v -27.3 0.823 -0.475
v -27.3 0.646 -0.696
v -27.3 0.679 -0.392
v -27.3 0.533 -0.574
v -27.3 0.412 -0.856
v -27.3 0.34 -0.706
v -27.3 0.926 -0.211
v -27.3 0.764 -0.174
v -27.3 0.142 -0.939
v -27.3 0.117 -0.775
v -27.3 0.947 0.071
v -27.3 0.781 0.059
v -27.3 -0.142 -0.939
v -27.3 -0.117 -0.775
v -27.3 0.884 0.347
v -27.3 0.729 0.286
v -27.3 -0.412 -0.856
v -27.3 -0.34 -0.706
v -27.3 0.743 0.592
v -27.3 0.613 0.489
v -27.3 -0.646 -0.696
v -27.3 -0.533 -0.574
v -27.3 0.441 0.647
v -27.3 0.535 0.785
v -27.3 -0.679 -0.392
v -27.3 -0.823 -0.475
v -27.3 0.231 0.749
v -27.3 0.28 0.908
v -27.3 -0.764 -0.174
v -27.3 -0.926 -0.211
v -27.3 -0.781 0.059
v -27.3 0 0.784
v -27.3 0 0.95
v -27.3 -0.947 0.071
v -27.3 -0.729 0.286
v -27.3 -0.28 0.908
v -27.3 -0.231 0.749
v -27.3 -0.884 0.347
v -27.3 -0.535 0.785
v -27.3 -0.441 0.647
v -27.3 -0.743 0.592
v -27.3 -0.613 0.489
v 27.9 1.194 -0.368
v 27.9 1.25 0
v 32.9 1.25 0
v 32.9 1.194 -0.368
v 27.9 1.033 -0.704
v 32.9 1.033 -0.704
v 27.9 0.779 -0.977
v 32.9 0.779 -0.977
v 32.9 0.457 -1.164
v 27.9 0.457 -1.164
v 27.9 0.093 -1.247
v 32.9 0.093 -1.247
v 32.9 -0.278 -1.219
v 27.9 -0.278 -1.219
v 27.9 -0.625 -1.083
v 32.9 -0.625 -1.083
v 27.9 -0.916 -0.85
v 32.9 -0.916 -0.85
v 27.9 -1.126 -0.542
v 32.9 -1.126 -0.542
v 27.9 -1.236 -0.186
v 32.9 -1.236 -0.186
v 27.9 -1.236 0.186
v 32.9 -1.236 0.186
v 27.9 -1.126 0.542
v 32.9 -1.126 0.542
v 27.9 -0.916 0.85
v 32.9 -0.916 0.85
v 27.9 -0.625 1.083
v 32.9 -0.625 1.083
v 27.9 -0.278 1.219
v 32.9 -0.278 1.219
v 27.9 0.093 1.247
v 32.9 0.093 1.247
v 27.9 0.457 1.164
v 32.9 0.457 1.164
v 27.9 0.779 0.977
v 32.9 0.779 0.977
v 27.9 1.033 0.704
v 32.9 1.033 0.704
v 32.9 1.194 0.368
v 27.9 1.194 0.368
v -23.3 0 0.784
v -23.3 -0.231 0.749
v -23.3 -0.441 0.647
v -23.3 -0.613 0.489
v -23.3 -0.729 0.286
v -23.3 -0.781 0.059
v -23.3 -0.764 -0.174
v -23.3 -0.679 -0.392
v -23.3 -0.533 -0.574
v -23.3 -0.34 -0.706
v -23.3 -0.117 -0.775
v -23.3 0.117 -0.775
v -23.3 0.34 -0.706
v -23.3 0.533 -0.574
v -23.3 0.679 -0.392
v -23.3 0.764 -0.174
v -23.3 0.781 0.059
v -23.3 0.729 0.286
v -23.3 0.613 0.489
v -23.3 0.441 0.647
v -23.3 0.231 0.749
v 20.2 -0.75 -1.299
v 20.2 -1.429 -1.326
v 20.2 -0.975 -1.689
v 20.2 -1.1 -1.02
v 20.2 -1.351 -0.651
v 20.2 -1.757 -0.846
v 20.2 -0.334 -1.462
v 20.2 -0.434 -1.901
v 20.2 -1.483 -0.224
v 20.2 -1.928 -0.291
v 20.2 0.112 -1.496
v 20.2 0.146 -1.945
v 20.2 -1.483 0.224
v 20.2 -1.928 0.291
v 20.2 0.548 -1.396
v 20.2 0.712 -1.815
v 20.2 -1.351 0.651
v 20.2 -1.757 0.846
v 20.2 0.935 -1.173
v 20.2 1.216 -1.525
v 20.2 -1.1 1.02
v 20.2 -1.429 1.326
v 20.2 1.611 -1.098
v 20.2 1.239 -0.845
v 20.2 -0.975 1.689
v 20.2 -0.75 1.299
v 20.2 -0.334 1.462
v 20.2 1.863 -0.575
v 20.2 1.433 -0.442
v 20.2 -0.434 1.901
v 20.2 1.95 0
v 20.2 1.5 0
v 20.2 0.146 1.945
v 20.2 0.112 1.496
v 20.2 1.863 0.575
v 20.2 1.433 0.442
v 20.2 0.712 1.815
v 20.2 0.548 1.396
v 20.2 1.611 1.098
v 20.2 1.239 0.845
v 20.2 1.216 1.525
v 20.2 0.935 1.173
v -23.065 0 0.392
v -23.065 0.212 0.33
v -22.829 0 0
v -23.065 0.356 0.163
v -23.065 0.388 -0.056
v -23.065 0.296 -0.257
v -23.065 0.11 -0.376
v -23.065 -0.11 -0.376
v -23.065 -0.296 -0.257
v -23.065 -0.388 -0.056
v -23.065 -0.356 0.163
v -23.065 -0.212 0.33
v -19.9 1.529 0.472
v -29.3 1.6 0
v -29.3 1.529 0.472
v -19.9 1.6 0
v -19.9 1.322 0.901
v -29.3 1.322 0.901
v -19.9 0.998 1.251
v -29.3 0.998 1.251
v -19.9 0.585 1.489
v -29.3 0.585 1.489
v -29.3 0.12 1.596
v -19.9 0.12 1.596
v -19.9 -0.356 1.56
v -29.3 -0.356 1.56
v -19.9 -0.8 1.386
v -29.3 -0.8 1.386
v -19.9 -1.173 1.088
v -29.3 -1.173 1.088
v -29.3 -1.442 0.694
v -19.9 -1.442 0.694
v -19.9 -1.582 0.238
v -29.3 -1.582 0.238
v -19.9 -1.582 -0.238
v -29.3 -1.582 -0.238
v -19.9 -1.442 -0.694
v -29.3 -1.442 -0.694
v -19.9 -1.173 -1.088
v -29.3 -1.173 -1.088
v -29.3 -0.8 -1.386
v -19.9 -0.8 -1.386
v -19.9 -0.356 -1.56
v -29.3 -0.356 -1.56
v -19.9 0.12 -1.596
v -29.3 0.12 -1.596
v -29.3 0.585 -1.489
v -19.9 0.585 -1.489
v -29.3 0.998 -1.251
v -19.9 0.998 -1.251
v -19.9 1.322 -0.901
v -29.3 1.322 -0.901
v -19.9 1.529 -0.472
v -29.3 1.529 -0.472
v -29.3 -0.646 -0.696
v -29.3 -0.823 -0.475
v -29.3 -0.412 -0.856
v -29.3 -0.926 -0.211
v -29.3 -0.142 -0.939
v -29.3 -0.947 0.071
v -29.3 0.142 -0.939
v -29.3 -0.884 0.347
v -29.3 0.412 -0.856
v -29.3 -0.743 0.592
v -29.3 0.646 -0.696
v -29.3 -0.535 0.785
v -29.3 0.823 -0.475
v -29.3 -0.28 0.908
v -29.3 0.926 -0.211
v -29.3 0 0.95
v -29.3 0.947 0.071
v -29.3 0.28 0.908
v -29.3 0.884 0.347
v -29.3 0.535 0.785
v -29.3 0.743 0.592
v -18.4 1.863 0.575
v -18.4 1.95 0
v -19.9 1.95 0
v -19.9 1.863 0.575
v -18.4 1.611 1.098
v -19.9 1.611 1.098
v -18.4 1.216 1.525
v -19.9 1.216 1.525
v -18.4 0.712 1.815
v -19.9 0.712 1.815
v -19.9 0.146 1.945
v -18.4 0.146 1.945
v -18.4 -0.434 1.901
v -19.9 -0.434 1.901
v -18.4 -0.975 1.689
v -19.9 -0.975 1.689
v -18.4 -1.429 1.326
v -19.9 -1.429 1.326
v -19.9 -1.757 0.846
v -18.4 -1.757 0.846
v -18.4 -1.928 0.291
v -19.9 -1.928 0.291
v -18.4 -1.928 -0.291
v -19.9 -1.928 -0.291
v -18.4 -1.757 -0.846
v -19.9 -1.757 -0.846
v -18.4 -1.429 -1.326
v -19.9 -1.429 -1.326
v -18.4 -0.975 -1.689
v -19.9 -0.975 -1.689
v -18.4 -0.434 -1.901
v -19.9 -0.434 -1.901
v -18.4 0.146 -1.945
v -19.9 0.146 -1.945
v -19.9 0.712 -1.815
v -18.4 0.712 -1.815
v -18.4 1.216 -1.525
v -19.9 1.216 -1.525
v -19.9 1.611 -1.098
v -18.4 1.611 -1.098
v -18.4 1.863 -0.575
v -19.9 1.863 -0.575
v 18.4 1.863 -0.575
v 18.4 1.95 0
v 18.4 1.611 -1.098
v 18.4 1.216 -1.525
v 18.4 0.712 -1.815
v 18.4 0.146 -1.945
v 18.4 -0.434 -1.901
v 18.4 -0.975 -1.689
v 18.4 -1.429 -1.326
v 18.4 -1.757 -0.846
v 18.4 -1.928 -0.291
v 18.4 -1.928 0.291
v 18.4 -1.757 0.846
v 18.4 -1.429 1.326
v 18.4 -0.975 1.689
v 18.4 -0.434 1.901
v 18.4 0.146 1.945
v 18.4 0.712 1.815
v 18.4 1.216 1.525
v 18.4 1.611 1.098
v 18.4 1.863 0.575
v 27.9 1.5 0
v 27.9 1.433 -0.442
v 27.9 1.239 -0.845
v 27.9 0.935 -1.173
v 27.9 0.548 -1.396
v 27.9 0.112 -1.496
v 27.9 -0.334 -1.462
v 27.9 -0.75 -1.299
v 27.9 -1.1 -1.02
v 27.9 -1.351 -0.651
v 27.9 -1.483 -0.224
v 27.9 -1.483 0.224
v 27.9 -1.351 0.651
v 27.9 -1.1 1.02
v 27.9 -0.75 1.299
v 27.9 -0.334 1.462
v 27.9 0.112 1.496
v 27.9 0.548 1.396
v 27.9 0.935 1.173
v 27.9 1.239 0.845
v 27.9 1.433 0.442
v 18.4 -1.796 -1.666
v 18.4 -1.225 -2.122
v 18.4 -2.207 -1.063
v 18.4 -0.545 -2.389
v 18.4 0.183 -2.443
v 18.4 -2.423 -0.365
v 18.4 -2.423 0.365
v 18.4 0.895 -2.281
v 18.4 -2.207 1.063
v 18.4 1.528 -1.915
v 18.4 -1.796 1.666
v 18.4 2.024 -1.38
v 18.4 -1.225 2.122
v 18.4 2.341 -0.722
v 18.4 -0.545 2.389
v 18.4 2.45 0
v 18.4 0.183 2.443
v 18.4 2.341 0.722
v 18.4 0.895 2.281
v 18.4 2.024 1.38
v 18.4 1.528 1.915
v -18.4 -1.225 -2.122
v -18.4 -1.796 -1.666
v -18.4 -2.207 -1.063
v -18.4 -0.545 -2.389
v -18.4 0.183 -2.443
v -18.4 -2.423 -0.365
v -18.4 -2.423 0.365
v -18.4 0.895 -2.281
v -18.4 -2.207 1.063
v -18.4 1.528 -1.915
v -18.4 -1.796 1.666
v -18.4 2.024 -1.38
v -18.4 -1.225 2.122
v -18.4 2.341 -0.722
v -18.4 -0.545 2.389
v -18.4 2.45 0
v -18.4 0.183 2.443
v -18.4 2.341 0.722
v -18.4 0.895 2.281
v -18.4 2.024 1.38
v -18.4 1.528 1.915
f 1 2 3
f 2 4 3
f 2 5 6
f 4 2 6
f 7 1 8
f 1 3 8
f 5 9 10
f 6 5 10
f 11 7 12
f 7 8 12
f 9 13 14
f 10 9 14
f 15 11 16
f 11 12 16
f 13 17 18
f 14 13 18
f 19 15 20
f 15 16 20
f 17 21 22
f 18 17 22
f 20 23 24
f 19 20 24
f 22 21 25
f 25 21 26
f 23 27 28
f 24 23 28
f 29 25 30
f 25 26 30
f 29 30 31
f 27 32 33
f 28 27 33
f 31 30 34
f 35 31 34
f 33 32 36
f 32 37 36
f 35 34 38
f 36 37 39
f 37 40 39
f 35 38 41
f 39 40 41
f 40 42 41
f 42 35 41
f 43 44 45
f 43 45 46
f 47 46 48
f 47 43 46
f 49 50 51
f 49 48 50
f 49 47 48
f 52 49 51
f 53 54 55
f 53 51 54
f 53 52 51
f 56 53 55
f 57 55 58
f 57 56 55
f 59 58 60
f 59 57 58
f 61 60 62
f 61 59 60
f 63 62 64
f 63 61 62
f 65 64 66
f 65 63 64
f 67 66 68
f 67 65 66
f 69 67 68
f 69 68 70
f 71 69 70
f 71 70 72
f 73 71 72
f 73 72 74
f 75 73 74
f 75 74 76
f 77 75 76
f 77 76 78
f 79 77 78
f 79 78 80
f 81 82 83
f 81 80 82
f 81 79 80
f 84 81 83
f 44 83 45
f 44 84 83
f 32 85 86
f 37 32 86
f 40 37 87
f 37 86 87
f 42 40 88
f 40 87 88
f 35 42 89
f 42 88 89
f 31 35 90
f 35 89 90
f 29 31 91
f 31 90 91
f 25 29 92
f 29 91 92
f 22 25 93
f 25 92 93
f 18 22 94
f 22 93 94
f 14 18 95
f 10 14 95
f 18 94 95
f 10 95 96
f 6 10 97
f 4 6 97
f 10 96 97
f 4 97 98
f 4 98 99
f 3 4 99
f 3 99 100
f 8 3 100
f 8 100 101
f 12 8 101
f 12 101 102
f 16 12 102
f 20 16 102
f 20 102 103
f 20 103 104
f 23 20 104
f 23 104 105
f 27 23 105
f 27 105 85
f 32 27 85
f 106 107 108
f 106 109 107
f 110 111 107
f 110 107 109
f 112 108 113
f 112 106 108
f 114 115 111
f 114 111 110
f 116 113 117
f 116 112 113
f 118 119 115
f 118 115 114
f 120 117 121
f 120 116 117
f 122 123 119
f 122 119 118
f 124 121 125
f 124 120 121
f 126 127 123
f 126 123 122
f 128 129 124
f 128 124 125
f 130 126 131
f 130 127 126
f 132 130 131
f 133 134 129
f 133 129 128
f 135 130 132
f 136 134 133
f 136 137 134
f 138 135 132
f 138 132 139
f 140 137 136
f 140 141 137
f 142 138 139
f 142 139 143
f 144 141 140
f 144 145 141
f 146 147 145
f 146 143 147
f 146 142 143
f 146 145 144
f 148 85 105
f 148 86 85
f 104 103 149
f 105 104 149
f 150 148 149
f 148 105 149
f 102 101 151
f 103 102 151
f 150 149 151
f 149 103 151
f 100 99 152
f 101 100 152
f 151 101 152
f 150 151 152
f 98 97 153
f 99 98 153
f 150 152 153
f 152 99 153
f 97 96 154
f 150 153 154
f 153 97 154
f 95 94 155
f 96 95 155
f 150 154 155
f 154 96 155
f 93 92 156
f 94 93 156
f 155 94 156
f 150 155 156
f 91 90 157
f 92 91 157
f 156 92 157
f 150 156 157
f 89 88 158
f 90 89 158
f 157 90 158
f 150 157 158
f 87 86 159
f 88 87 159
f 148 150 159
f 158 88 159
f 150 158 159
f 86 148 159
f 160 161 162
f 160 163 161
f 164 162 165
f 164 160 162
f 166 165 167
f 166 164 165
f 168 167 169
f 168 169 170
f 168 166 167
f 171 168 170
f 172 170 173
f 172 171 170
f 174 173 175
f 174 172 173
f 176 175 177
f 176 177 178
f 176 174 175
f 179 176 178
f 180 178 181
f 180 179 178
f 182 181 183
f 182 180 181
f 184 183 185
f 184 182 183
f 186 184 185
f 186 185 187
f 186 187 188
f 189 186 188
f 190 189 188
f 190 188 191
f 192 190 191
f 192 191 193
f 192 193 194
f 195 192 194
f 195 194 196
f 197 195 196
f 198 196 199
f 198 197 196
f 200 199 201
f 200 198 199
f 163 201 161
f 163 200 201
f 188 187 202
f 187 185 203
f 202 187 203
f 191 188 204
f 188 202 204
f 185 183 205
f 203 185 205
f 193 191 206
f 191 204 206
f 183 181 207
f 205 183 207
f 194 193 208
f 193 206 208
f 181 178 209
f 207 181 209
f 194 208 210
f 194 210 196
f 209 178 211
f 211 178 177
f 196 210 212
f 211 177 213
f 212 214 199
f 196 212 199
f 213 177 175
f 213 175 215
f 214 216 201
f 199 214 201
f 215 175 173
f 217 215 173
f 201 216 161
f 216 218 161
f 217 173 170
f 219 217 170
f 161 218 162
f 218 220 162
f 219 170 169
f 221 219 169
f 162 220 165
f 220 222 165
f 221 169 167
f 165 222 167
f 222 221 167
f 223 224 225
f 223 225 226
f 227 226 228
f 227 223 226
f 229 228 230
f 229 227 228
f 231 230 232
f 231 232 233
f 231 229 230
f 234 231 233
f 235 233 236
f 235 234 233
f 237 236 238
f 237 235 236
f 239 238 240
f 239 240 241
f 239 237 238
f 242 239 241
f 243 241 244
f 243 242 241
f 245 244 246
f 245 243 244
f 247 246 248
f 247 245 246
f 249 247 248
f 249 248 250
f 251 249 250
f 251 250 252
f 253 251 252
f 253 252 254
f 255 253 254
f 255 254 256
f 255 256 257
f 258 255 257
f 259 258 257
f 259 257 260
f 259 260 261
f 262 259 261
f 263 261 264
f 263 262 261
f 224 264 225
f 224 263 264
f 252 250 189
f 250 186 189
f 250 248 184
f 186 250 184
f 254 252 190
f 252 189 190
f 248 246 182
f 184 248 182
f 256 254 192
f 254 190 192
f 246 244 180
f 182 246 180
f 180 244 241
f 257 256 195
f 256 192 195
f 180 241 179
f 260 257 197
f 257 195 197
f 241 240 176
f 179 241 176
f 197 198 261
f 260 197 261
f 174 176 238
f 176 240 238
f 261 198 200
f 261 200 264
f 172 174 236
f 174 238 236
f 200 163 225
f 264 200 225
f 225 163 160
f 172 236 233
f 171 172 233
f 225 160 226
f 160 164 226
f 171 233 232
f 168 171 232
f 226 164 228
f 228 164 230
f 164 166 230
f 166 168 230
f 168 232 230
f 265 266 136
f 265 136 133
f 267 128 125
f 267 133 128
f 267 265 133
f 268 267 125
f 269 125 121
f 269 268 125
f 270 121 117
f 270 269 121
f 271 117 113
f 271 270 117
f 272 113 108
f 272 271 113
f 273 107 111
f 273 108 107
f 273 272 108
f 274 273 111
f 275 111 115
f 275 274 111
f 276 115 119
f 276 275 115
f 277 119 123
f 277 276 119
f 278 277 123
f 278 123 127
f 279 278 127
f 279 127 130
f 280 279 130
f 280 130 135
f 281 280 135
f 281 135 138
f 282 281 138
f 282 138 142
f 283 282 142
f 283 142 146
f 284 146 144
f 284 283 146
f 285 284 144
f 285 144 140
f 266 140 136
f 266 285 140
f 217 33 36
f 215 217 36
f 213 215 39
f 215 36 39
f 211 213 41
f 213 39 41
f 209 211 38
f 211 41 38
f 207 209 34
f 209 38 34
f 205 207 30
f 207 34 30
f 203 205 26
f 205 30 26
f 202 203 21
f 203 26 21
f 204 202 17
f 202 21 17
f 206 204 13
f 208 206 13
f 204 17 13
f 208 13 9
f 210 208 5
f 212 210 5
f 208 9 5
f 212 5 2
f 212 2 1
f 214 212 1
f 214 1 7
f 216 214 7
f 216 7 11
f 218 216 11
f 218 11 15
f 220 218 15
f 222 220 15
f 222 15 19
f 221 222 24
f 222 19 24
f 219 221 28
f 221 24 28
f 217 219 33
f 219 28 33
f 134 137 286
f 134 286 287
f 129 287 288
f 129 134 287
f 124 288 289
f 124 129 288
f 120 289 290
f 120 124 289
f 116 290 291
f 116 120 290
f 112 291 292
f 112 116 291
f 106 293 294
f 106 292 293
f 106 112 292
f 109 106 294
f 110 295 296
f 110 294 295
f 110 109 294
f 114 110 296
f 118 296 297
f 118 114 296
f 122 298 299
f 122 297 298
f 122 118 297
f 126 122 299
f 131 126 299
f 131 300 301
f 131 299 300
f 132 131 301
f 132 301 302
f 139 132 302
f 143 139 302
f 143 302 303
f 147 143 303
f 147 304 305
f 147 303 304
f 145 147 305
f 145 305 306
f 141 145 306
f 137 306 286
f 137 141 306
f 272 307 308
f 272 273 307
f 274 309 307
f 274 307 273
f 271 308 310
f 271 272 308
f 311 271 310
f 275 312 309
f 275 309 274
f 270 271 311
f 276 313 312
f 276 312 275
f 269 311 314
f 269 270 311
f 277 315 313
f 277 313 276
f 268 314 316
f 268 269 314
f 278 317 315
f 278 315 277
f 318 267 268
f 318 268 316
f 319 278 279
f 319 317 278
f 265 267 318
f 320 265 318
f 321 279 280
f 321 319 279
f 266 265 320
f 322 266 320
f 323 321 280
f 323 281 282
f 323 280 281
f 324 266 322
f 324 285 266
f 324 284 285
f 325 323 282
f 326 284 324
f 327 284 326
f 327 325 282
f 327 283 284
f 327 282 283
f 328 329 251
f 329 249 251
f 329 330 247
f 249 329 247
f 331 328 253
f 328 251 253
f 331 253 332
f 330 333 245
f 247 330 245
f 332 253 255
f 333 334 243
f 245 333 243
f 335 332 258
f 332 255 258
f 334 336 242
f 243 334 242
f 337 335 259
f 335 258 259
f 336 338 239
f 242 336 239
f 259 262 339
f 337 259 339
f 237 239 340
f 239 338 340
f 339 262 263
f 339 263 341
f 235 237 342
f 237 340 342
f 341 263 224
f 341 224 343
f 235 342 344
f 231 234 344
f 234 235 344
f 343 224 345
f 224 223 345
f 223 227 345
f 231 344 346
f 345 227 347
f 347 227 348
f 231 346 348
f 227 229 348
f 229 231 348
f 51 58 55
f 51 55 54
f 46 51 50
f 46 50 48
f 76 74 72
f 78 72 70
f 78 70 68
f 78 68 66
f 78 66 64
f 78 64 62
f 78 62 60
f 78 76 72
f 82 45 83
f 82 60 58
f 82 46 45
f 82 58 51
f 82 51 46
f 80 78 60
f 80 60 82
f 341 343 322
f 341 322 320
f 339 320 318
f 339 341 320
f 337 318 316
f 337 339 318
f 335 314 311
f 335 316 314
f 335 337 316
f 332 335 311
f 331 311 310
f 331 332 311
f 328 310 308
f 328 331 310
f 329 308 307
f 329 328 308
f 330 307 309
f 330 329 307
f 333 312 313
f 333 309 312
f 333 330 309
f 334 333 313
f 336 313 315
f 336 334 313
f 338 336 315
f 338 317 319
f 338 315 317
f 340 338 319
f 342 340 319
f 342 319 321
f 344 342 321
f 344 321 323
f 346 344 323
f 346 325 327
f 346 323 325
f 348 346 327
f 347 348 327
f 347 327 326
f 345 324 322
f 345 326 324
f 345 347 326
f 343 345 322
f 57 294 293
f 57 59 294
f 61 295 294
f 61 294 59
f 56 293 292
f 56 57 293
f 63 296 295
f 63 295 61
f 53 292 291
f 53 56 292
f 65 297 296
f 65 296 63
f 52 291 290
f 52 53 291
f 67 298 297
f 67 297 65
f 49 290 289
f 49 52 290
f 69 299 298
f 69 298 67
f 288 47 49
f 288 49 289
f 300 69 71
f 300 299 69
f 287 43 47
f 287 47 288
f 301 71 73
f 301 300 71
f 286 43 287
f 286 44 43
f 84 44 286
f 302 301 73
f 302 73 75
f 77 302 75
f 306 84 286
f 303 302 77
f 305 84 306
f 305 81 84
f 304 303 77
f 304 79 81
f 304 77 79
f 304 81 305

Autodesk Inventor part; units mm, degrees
ref_plane "YZ Plane" through (0, 0, 0) normal (1, 0, 0) x (0, 1, 0)
ref_plane "XZ Plane" through (0, 0, 0) normal (0, 1, 0) x (-1, 0, 0)
ref_plane "XY Plane" through (0, 0, 0) normal (0, 0, 1) x (1, 0, 0)
sketch "Sketch1" plane through (0, 0, 0) normal (0, 0, 1) x (1, 0, 0)
  line L0 (-18.4, 0) -> (18.4, 0)
  line L1 (18.4, 0) -> (18.4, 2.45)
  line L2 (18.4, 2.45) -> (-18.4, 2.45)
  line L3 (-18.4, 2.45) -> (-18.4, 0)
  line L4 (-18.4, 0) -> (-19.9, 0)
  line L5 (-19.9, 0) -> (-19.9, 1.95)
  line L6 (-19.9, 1.95) -> (-18.4, 1.95)
  line L7 (-18.4, 1.95) -> (-18.4, 0)
  line L8 (-19.9, 0) -> (-29.3, 0)
  line L9 (-29.3, 0) -> (-29.3, 1.6)
  line L10 (-29.3, 1.6) -> (-19.9, 1.6)
  line L11 (-19.9, 1.6) -> (-19.9, 0)
  line L12 (18.4, 0) -> (20.2, 0)
  line L13 (20.2, 0) -> (20.2, 1.95)
  line L14 (20.2, 1.95) -> (18.4, 1.95)
  line L15 (18.4, 1.95) -> (18.4, 0)
  line L16 (20.2, 0) -> (27.9, 0)
  line L17 (27.9, 0) -> (27.9, 1.5)
  line L18 (27.9, 1.5) -> (20.2, 1.5)
  line L19 (20.2, 1.5) -> (20.2, 0)
  line L20 (27.9, 0) -> (32.9, 0)
  line L21 (32.9, 0) -> (32.9, 1.25)
  line L22 (32.9, 1.25) -> (27.9, 1.25)
  line L23 (27.9, 1.25) -> (27.9, 0)
  point P0 (0, 0)
  point P1 (0, 0)
  dimension "d0" = 9.4
  dimension "d1" = 10.9
  dimension "d2" = 47.7
  dimension "d3" = 3.2
  dimension "d4" = 3.9
  dimension "d5" = 4.9
  dimension "d6" = 3
  dimension "d7" = 49.5
  dimension "d21" = 2.5
  dimension "d22" = 62.2
  dimension "d23" = 5
revolve "Revolution1" add sketch "Sketch1" angle 360 about axis through (-18.4, 0, 0) along (1, 0, 0)
thread "Thread1" size "M2.5x0.45" class "6g" standard "ANSI Metric M Profile" length 5
hole "Hole1" at (-29.3, 0, 0) direction (1, 0, 0) diameter 1.567 depth 6 tip angle 118 counterbore diameter 1.9 counterbore depth 2 thread size "M2x0.4" class "6H" standard "ANSI Metric M Profile"
properties part number "401-05" material "Aluminum-6061"
